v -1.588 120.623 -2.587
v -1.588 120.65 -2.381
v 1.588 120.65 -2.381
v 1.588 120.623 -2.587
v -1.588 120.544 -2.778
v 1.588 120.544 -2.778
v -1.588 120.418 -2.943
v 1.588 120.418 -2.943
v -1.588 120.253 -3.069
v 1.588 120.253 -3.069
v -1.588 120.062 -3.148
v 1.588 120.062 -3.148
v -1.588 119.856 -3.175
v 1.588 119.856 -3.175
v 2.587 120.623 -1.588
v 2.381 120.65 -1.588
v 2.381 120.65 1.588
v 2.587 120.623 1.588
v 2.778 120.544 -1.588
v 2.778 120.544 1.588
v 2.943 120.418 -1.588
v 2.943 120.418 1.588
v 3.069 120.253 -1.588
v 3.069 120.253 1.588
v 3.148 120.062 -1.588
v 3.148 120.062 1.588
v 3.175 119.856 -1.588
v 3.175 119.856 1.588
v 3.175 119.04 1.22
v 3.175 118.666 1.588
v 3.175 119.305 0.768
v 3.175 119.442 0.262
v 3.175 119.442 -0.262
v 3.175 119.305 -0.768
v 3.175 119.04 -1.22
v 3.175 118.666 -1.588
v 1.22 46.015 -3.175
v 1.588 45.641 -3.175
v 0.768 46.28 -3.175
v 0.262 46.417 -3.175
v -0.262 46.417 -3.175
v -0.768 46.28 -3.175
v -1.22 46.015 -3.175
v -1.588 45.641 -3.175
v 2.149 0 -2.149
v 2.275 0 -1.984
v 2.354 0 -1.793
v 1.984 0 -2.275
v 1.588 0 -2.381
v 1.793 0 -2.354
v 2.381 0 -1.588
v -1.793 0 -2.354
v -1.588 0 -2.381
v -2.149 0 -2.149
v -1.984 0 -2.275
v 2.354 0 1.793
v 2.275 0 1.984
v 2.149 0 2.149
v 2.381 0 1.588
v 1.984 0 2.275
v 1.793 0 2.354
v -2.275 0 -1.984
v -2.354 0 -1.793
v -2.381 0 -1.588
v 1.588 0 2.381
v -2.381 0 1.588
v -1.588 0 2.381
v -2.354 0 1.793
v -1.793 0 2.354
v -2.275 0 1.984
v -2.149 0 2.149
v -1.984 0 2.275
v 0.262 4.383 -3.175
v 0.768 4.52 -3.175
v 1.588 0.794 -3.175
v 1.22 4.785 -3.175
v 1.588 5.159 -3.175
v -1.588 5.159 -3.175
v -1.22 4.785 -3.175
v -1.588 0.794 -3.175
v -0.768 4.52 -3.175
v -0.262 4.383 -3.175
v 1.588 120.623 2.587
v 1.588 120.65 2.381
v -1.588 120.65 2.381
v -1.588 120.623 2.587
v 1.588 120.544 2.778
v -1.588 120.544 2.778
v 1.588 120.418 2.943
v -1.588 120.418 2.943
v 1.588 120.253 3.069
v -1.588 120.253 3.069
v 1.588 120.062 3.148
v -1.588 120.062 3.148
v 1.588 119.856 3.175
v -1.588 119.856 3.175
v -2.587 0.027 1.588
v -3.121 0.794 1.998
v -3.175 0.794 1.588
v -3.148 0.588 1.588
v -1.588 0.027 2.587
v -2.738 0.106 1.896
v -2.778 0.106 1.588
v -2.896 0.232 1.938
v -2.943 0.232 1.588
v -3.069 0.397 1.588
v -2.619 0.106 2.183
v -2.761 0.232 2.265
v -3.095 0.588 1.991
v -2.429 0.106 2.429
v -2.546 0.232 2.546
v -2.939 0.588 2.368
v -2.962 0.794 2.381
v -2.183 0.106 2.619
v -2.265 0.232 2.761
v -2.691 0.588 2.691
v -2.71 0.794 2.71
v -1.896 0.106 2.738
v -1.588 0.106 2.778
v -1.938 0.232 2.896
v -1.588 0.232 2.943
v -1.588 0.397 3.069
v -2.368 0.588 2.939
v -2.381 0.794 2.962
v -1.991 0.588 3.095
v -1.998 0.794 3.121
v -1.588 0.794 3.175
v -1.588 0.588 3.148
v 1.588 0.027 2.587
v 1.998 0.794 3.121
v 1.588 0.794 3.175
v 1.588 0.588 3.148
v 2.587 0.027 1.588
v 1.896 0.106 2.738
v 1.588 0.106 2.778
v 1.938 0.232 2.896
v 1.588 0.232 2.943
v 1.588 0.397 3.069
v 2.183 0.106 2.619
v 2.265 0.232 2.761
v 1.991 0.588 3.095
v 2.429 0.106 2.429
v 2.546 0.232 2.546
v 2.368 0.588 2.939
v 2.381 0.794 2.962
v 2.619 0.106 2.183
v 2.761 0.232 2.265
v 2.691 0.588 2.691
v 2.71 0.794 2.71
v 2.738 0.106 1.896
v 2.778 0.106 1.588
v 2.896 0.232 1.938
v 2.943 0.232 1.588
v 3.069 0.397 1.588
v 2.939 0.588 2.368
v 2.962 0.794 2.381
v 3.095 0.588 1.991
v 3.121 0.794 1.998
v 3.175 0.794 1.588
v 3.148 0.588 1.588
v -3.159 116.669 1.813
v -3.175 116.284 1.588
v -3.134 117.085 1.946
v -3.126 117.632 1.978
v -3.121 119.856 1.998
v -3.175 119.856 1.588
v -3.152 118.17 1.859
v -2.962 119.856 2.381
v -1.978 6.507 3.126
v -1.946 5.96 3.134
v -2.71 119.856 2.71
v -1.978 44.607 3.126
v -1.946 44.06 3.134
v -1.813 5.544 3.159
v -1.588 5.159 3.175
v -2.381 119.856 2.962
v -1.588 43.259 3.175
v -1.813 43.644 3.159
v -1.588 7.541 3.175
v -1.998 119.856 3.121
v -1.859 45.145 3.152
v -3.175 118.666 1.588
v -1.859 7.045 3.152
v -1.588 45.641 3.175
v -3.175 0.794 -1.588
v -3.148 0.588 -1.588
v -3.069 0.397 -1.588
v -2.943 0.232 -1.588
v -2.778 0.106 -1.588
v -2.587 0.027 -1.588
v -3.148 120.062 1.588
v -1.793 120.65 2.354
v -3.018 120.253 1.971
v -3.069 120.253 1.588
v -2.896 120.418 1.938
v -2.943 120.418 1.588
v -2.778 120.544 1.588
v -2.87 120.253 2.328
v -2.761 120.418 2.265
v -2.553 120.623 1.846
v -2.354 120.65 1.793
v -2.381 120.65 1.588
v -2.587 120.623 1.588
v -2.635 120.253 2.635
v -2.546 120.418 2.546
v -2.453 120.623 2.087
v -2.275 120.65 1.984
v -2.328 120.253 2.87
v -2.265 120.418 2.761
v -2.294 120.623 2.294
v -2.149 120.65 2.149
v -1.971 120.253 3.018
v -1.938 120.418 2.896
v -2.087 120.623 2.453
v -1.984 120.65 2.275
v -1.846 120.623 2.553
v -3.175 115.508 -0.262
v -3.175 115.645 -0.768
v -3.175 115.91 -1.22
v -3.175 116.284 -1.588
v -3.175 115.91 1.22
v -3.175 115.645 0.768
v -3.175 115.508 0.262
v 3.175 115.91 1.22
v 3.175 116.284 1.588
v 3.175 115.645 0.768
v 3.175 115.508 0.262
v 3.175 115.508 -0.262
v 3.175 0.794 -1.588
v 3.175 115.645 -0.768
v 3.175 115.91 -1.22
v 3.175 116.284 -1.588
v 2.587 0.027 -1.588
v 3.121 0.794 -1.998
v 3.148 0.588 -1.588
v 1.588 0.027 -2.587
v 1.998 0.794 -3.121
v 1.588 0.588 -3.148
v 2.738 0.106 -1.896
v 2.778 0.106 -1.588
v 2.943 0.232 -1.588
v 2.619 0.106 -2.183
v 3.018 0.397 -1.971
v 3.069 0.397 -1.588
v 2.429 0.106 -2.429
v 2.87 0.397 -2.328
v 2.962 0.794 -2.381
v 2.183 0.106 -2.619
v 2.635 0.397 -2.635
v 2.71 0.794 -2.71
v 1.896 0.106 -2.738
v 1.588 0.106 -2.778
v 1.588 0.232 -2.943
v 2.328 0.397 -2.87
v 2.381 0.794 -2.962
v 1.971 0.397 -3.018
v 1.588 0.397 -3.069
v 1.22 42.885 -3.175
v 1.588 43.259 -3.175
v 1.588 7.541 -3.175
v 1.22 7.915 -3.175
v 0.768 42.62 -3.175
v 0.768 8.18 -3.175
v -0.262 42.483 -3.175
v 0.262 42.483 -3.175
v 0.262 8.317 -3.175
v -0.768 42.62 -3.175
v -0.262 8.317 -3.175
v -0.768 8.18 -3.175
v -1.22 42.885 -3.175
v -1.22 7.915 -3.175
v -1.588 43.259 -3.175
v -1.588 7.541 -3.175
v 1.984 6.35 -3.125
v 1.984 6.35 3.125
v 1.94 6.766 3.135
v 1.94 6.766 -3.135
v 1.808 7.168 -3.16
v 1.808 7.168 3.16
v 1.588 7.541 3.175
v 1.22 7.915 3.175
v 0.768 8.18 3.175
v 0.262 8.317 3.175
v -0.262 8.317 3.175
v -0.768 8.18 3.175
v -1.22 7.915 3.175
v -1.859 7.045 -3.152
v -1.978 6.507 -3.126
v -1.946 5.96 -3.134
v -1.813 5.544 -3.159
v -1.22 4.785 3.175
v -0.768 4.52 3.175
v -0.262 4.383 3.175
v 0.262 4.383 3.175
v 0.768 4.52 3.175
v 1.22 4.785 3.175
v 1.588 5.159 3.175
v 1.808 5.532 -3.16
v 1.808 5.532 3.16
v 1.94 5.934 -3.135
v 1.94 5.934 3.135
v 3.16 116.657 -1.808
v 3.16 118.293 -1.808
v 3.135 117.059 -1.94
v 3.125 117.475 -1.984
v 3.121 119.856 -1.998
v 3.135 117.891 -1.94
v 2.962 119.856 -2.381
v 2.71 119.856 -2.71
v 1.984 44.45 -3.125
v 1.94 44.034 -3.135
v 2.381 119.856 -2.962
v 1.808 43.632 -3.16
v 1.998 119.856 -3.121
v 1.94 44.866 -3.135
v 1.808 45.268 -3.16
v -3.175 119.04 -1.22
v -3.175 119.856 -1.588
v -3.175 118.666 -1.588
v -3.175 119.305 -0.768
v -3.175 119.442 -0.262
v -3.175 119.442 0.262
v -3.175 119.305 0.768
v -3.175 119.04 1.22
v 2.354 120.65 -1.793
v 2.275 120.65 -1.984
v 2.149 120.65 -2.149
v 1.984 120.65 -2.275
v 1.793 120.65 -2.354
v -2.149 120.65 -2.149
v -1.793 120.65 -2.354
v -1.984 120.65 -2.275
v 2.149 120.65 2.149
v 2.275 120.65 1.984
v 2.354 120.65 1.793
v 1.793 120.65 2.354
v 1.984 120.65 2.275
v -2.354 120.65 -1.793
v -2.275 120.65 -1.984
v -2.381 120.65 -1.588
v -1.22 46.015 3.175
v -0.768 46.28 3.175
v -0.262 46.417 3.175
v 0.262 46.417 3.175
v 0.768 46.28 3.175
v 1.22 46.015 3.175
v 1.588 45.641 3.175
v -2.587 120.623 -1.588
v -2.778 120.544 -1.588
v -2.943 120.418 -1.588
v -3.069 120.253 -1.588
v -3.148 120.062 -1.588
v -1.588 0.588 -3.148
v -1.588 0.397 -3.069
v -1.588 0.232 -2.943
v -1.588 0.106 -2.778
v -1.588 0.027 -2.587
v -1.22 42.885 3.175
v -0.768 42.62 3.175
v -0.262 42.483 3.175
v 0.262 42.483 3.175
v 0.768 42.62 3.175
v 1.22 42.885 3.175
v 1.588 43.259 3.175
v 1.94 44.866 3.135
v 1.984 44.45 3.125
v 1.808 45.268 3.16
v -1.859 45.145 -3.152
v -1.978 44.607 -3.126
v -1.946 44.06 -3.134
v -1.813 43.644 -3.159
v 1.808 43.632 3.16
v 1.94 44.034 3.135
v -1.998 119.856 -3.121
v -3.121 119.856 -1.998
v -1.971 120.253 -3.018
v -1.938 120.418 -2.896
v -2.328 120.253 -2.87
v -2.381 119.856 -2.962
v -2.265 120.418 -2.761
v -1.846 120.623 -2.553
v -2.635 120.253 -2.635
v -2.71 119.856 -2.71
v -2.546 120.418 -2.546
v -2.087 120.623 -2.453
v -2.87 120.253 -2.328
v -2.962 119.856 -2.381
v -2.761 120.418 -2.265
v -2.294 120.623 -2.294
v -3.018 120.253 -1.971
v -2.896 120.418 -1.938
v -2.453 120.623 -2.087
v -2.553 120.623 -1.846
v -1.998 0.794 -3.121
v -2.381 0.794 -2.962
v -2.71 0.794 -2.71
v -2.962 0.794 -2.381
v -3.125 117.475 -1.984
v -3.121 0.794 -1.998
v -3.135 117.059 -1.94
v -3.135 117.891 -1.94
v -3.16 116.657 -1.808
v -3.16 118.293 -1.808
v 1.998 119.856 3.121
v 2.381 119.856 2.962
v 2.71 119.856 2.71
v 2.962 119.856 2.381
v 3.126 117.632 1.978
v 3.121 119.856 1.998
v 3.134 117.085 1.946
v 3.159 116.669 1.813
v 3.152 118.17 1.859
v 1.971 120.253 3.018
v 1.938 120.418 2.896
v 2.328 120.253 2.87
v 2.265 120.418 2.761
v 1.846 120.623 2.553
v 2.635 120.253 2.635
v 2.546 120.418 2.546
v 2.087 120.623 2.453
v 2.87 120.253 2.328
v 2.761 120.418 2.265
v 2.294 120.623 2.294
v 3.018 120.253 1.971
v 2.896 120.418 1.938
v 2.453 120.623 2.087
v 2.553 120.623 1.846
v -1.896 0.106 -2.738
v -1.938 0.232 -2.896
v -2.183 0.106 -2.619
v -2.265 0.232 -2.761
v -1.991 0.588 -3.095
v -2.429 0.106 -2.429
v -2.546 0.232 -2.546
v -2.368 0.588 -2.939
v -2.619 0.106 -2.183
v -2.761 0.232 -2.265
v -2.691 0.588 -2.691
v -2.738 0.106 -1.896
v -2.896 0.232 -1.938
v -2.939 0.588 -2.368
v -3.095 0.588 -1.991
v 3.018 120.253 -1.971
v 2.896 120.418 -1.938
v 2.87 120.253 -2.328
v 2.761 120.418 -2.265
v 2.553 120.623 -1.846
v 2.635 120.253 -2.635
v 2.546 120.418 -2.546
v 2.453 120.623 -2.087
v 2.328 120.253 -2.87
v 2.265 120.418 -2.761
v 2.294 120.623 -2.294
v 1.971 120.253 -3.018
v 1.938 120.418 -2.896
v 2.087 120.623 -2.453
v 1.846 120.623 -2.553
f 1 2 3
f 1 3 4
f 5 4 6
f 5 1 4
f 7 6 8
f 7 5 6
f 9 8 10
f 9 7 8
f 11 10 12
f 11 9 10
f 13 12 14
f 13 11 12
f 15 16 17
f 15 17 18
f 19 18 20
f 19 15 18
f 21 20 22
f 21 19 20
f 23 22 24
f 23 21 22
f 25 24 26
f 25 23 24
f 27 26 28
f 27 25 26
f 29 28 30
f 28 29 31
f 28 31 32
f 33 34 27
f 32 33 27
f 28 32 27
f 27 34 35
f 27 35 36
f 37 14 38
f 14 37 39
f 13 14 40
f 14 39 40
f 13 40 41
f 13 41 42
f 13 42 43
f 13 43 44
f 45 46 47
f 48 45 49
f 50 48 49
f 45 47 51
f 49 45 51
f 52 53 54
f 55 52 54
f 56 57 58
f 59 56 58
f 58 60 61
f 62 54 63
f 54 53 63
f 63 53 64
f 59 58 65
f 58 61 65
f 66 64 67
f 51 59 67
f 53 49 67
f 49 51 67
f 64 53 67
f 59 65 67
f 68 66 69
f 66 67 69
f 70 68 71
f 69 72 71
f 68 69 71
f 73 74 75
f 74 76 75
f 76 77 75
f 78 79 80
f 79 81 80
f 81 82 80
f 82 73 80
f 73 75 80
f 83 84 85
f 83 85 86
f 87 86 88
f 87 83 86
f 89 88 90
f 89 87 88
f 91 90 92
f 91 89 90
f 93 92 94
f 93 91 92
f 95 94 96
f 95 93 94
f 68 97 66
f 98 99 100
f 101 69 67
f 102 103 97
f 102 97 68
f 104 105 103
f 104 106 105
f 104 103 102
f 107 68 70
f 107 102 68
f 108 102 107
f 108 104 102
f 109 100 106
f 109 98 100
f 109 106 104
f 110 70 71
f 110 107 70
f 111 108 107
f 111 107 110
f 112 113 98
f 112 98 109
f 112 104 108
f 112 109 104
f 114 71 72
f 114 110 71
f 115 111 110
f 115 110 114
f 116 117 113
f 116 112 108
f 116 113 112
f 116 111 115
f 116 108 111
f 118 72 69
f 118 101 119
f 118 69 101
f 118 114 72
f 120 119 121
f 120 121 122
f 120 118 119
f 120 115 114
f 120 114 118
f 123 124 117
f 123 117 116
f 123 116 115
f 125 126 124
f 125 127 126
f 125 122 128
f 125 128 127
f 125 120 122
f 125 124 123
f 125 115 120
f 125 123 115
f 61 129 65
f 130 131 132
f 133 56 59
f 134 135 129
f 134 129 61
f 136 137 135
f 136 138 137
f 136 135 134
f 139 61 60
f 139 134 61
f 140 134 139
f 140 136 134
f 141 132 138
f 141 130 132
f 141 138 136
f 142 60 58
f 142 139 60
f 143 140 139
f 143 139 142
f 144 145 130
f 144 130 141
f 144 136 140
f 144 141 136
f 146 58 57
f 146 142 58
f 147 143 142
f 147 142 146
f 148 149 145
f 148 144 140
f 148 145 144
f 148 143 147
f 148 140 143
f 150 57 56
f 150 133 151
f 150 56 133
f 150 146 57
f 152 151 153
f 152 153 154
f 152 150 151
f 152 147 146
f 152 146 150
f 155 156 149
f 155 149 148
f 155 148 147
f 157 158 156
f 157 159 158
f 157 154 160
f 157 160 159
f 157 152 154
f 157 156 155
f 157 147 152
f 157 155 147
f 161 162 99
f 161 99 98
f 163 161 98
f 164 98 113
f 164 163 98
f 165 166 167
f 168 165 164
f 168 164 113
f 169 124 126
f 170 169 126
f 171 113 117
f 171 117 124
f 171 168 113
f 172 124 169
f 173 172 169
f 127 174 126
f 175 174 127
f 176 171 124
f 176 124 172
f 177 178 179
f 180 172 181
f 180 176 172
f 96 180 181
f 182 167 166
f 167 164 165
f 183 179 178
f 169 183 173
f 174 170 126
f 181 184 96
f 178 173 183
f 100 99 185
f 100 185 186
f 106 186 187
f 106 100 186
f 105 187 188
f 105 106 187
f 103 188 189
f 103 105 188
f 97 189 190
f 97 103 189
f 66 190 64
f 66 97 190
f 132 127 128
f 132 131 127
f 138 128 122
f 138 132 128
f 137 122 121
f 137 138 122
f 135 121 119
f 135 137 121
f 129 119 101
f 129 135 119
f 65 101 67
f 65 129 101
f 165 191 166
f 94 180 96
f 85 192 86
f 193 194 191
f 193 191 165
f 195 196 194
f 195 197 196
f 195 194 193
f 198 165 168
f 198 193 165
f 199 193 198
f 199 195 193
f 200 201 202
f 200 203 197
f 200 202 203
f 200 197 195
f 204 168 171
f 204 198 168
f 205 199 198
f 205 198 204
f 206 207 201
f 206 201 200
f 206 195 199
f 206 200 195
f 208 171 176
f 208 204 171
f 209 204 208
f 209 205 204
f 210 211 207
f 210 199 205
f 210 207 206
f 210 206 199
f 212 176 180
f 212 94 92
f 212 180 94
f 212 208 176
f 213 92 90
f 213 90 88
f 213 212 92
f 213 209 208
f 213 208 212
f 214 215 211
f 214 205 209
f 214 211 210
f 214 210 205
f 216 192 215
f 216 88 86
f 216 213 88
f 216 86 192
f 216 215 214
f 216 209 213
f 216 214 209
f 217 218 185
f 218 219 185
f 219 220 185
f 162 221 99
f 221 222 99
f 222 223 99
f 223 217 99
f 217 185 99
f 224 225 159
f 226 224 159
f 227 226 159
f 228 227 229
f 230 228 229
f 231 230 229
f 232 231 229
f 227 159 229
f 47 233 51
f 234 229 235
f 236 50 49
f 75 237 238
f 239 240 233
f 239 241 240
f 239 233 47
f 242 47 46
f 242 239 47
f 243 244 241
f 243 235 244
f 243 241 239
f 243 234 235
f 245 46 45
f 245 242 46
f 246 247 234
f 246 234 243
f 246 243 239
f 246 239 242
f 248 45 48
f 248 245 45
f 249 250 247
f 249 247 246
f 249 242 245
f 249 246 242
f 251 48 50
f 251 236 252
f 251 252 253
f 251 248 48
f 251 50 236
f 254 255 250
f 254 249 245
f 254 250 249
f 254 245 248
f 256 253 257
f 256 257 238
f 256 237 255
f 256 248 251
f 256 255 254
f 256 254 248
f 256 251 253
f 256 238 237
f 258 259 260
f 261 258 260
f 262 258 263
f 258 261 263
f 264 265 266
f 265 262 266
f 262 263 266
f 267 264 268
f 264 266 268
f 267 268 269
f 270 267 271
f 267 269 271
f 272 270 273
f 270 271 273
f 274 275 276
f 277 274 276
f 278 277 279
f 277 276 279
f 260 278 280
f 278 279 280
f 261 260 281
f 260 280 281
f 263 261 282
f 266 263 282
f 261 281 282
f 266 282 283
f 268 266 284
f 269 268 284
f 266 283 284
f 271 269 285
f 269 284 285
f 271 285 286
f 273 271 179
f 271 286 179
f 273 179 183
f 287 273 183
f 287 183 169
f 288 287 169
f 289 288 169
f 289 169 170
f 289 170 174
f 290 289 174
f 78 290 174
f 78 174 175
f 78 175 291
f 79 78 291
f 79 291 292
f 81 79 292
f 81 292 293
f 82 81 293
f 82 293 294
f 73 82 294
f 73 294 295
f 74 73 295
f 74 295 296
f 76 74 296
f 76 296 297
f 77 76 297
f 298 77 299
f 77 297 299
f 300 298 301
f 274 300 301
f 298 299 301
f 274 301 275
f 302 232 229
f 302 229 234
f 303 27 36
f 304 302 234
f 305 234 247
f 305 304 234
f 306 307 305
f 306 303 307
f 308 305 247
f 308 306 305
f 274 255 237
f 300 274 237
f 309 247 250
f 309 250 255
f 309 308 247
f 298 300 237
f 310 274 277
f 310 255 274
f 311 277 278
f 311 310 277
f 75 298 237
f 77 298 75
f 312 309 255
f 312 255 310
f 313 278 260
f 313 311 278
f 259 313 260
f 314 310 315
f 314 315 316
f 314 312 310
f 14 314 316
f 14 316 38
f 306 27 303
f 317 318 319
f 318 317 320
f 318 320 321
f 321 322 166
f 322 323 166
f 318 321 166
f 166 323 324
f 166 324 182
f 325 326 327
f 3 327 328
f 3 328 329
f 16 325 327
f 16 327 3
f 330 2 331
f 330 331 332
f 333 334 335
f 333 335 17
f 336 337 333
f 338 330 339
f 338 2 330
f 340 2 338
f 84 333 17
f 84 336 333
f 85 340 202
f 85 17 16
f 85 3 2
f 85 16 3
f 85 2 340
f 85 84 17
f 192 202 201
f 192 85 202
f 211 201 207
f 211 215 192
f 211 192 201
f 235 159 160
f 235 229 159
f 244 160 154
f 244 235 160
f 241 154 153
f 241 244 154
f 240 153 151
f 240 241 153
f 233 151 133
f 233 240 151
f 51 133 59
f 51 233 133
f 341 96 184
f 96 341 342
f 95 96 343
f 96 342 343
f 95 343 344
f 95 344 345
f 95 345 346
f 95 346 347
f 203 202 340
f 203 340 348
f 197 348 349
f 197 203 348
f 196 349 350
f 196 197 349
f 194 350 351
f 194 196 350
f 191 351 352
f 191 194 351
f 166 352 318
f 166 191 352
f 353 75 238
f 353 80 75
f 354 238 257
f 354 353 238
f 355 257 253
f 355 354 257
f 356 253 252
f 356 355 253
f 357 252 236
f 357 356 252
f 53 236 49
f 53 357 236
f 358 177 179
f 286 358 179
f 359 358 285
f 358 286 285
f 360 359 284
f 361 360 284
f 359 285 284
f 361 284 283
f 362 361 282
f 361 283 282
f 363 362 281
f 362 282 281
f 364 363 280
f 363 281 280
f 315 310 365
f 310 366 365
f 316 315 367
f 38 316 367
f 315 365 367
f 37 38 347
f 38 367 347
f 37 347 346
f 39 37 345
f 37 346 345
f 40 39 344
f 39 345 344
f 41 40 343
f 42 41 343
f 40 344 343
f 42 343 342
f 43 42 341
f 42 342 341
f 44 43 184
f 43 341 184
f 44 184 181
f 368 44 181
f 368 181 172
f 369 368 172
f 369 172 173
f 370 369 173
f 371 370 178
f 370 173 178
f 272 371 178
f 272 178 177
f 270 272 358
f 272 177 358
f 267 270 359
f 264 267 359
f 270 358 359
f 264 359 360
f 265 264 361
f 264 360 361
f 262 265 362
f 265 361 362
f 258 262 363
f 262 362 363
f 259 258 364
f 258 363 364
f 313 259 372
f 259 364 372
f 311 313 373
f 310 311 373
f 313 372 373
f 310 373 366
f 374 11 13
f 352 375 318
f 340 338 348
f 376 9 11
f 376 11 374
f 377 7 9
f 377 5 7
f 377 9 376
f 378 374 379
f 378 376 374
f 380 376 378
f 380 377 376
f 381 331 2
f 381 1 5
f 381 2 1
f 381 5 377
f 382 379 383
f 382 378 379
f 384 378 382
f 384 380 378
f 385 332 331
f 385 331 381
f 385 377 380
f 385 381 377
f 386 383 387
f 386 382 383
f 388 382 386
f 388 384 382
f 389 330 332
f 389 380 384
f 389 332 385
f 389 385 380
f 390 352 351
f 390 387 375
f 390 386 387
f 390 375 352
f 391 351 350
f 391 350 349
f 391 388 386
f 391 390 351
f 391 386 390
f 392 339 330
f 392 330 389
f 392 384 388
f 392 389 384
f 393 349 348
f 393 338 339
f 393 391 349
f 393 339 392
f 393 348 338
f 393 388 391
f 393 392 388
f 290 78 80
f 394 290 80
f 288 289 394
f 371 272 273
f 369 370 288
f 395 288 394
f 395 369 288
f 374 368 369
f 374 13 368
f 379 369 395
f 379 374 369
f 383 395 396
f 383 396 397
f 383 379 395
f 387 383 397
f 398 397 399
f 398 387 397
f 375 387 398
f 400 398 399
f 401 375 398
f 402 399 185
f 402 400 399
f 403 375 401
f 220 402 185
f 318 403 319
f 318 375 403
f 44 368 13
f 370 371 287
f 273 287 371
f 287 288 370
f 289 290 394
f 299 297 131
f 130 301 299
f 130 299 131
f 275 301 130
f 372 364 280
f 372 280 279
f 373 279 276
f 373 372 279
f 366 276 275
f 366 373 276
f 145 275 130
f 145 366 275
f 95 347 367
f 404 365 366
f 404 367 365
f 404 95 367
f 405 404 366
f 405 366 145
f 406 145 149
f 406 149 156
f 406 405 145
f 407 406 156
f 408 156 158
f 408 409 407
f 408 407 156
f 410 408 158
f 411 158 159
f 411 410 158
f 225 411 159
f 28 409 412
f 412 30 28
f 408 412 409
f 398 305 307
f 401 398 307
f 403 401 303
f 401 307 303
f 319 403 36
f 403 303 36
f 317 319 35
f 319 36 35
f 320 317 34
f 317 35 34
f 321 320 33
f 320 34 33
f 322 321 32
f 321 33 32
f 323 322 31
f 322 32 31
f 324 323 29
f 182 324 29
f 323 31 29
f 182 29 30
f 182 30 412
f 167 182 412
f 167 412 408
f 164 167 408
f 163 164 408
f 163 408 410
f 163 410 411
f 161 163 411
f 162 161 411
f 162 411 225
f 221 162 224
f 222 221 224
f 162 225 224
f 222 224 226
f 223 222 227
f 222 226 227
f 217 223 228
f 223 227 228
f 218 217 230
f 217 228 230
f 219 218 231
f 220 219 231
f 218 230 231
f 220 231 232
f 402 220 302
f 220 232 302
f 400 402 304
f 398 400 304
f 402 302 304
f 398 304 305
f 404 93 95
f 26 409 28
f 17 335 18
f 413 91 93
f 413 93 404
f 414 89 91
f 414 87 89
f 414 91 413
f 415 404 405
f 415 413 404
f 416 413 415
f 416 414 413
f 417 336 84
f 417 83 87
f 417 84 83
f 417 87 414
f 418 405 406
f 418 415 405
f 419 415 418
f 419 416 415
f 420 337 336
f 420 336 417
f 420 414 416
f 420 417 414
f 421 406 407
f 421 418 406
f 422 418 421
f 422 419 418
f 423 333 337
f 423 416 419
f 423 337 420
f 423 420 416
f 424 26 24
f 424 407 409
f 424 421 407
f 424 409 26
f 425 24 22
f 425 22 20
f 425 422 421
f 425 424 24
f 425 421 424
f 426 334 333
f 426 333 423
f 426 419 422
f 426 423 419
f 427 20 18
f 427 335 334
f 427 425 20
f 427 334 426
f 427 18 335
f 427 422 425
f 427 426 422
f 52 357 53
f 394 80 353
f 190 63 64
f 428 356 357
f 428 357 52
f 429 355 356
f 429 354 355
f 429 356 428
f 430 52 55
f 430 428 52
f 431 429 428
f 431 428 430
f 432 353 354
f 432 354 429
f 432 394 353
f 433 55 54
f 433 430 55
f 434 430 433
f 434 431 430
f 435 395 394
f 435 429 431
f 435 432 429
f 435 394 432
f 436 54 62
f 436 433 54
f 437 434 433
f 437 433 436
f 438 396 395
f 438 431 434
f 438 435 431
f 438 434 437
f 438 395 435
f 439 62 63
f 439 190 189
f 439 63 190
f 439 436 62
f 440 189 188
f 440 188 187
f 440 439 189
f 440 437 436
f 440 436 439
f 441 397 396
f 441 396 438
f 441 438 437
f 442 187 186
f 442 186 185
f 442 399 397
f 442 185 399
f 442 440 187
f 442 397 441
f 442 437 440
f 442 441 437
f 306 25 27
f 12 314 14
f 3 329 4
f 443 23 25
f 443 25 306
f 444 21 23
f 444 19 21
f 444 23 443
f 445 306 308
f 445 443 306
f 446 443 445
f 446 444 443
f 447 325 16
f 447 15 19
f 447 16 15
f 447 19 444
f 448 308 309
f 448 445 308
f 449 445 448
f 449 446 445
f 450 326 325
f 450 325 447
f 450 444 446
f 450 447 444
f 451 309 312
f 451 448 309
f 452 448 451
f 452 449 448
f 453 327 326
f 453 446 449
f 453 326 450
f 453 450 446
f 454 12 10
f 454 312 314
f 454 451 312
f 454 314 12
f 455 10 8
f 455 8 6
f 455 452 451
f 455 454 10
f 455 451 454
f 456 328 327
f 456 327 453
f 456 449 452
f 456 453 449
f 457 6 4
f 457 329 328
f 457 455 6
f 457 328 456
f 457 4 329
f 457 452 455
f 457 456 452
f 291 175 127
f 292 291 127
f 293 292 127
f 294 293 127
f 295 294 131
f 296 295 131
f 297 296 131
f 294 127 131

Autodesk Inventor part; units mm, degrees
ref_plane "YZ Plane" through (0, 0, 0) normal (1, 0, 0) x (0, 1, 0)
ref_plane "XZ Plane" through (0, 0, 0) normal (0, 1, 0) x (-1, 0, 0)
ref_plane "XY Plane" through (0, 0, 0) normal (0, 0, 1) x (1, 0, 0)
sketch "Sketch1" plane through (0, 0, 0) normal (0, 1, 0) x (-1, 0, 0)
  line L0 (-3.175, -3.175) -> (3.175, -3.175)
  line L1 (3.175, -3.175) -> (3.175, 3.175)
  line L2 (3.175, 3.175) -> (-3.175, 3.175)
  line L3 (-3.175, 3.175) -> (-3.175, -3.175)
  line L4 (-3.175, -3.175) -> (3.175, 3.175) construction
  line L5 (3.175, -3.175) -> (-3.175, 3.175) construction
  point P0 (0, 0)
  dimension "d0" = 6.35
  dimension "d1" = 6.35
extrude "Extrusion1" add sketch "Sketch1" along normal blind 120.65
fillet "Fillet1" radius 1.5875 4 edges at (3.175, 60.325, 3.175) (3.175, 60.325, -3.175) (-3.175, 60.325, -3.175) (-3.175, 60.325, 3.175)
fillet "Fillet2" radius 0.7937 16 edges at (2.71, 120.65, -2.71) (0, 120.65, -3.175) (-2.71, 120.65, -2.71) (-3.175, 120.65, 0) (-2.71, 120.65, 2.71) (0, 120.65, 3.175) (2.71, 120.65, 2.71) (3.175, 120.65, 0) (2.71, 0, -2.71) (0, 0, -3.175) (-2.71, 0, -2.71) (-3.175, 0, 0) (-2.71, 0, 2.71) (0, 0, 3.175) (2.71, 0, 2.71) (3.175, 0, 0)
sketch "Sketch2" plane through (-1.5875, 0.7937, 3.175) normal (0, 0, 1) x (1, 0, 0)
  circle A0 centre (1.5875, 5.5563) radius 1.9844
  line L0 (0, -0.7937) -> (3.175, -0.7937) projected
  point P0 (1.5875, -0.7937)
  dimension "d6" = 3.9688
  dimension "d7" = 6.35
extrude "Extrusion2" cut sketch "Sketch2" against normal blind 120.65
sketch "Sketch3" plane through (3.175, 0.7937, -1.5875) normal (1, 0, 0) x (0, 0, -1)
  circle A0 centre (-1.5875, 116.6812) radius 1.9844
  line L0 (0, 119.8562) -> (-3.175, 119.8562) projected
  line L1 (1.5875, 6.7469) -> (1.5875, 119.0625) projected
  point P0 (-1.5875, -0.7937)
  dimension "d10" = 3.9688
  dimension "d11" = 3.175
  dimension "d12" = 3.175
extrude "Extrusion3" cut sketch "Sketch3" against normal blind 120.65
sketch "Sketch4" plane through (-1.5875, 119.8562, 3.175) normal (0, 0, 1) x (1, 0, 0)
  arc A0 (3.175, -112.3156) -> (0, -112.3156) centre (1.5875, -113.5062) ccw projected
  circle A1 centre (1.5875, -75.4062) radius 1.9844
  point P0 (1.5875, -119.8562)
  dimension "d15" = 3.9688
  dimension "d16" = 38.1
extrude "Extrusion4" cut sketch "Sketch4" against normal blind 120.65
properties part number "support beam" material "Stainless Steel"
